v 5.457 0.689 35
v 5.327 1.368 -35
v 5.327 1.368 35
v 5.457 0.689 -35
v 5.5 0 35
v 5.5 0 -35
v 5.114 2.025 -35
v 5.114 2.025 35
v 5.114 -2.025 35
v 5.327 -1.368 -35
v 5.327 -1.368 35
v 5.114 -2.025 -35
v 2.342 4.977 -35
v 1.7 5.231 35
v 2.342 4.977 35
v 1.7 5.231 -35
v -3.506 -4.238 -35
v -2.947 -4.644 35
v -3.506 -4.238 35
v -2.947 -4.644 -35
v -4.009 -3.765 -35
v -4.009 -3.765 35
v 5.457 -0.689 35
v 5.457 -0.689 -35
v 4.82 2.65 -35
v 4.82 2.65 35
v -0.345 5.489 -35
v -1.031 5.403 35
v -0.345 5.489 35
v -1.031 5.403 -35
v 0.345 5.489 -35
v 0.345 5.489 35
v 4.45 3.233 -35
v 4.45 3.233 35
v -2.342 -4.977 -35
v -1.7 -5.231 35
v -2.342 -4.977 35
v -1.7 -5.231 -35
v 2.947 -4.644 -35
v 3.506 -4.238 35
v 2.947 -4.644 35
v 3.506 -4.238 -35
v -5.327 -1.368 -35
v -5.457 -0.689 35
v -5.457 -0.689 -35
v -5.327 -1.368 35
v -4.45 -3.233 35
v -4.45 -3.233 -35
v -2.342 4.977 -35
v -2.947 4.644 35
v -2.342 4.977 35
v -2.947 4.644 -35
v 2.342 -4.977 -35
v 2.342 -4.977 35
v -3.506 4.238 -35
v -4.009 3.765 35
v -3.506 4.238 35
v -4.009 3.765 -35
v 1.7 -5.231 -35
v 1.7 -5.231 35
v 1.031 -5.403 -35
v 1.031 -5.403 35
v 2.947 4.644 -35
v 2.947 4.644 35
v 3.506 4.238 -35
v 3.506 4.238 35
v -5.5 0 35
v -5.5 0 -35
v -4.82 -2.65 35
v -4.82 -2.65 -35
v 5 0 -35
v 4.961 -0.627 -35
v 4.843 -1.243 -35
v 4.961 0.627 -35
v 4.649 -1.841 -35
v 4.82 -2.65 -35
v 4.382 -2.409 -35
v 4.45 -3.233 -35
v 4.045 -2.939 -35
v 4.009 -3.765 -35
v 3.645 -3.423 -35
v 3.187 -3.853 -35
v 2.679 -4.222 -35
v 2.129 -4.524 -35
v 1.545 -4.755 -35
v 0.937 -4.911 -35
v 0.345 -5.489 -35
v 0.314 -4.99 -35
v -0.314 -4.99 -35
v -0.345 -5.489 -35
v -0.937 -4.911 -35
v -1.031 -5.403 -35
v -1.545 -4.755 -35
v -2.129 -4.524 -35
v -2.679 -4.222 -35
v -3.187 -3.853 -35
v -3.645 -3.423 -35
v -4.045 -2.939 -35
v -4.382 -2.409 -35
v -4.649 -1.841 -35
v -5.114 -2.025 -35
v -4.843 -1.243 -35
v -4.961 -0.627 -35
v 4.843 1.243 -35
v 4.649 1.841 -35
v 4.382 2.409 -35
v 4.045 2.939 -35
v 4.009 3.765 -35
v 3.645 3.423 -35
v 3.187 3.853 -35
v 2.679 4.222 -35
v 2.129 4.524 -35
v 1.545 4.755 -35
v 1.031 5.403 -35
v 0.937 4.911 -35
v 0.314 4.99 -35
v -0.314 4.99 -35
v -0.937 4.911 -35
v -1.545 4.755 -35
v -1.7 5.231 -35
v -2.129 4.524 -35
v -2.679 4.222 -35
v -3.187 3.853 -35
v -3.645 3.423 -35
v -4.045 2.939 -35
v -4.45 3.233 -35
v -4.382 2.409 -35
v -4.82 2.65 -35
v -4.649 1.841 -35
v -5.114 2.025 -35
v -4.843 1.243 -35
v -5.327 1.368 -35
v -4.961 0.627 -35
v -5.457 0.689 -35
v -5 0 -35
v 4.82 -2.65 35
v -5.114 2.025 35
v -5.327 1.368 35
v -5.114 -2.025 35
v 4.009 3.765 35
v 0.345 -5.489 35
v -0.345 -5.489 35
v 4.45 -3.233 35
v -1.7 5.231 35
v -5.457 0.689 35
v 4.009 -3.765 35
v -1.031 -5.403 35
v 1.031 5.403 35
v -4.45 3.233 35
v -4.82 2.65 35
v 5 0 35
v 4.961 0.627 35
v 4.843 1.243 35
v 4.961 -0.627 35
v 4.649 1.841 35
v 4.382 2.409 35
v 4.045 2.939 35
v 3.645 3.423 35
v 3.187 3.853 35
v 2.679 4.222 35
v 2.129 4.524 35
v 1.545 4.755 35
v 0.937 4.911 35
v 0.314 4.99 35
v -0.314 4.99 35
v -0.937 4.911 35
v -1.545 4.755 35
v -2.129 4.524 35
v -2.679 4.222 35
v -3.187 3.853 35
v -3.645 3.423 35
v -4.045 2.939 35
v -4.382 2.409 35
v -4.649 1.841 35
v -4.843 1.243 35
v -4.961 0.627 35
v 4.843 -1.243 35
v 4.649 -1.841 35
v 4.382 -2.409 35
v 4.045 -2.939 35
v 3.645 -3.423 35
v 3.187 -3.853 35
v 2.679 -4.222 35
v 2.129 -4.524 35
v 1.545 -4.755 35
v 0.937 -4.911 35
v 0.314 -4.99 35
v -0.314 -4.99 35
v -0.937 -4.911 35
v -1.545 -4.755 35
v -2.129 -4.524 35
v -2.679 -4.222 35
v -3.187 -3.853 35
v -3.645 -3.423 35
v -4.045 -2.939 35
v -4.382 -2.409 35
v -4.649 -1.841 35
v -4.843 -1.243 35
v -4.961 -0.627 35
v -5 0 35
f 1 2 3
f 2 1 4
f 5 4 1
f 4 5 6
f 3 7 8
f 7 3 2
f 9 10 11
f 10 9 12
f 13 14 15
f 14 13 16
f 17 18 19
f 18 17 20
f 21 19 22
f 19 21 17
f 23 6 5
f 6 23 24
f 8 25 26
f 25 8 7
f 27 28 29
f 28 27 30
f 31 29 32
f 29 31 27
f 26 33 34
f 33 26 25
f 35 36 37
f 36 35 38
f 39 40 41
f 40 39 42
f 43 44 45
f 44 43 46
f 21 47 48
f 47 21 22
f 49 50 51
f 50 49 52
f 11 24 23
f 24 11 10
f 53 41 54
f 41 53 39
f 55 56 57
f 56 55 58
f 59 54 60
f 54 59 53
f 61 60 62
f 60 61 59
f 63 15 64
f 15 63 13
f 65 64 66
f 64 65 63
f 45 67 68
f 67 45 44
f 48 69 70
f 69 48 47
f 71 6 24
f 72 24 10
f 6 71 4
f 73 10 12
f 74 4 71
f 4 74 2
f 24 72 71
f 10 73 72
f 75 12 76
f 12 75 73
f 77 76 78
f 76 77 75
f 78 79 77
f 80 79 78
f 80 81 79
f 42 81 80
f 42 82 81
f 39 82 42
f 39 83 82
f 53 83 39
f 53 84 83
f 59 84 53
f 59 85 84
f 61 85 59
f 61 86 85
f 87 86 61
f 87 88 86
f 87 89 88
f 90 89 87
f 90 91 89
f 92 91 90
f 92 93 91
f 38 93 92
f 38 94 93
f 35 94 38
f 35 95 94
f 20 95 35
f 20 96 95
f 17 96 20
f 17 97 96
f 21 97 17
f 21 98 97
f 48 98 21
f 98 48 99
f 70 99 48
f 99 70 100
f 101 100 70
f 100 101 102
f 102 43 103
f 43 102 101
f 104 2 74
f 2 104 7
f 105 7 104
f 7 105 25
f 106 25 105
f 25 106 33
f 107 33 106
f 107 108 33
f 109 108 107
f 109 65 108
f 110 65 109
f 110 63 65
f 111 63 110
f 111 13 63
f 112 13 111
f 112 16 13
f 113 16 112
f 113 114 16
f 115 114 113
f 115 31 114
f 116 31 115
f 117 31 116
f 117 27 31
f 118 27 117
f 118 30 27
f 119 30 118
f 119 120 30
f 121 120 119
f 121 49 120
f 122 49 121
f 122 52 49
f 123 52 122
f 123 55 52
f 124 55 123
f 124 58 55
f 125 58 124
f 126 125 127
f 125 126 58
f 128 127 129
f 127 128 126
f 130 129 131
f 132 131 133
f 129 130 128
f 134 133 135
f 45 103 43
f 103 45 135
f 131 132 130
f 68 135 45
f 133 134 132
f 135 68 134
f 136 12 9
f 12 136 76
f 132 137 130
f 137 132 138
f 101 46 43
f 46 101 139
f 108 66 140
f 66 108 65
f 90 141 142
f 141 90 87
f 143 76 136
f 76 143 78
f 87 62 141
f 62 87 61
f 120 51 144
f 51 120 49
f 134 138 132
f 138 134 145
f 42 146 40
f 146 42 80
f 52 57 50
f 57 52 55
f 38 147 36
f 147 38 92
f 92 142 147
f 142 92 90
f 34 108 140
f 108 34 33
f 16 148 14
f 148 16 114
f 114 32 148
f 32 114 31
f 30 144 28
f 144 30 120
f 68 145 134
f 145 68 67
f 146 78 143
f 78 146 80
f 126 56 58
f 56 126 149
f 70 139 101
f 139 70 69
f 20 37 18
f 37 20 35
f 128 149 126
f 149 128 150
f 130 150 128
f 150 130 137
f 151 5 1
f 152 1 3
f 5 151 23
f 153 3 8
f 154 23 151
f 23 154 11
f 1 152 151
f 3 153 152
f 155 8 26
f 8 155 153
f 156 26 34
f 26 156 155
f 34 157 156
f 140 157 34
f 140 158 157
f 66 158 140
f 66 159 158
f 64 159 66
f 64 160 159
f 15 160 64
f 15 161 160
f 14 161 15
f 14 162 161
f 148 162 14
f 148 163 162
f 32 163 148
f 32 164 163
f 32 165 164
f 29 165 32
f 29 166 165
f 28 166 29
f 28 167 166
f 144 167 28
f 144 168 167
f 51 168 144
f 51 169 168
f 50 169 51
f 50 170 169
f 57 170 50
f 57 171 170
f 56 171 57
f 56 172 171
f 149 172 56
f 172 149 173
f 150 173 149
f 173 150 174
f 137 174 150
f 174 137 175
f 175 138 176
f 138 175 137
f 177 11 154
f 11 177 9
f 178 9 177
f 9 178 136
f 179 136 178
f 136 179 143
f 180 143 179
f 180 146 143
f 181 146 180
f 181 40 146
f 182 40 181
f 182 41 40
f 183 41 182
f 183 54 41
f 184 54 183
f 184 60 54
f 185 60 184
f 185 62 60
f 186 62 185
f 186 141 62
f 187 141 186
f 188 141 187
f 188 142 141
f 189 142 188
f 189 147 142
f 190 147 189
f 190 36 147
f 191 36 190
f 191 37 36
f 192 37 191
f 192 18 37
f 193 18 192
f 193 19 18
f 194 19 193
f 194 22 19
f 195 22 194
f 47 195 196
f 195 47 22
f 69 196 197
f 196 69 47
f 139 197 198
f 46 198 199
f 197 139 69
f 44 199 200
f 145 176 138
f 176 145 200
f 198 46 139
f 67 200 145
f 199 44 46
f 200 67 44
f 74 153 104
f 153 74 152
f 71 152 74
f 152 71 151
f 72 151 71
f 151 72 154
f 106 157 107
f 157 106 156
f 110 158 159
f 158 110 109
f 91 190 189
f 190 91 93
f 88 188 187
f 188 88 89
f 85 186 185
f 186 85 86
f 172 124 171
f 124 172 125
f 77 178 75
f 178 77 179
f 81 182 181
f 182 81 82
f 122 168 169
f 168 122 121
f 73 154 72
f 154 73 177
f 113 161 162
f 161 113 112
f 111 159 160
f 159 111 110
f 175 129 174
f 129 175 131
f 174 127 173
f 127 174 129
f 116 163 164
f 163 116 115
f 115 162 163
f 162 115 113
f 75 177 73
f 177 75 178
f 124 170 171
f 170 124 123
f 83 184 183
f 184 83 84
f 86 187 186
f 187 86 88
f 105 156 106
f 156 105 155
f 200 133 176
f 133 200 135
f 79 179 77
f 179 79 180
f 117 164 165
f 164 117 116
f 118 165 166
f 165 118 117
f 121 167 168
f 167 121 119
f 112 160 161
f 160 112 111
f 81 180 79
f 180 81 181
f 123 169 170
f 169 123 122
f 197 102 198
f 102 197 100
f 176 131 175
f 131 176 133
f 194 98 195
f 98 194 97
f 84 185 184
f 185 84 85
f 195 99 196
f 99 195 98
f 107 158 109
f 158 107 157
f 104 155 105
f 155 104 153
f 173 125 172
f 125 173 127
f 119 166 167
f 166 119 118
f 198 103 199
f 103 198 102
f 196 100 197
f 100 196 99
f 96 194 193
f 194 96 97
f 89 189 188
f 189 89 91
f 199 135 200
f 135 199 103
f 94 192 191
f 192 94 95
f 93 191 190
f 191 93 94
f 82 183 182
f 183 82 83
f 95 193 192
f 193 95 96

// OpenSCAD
$fn = 50;


difference() {
	union() {
		translate(v = [0, 0, -35.0000000000]) {
			cylinder(h = 70, r = 5.5000000000);
		}
	}
	union() {
		translate(v = [0, 0, -100.0000000000]) {
			cylinder(h = 200, r = 5.0000000000);
		}
	}
}
